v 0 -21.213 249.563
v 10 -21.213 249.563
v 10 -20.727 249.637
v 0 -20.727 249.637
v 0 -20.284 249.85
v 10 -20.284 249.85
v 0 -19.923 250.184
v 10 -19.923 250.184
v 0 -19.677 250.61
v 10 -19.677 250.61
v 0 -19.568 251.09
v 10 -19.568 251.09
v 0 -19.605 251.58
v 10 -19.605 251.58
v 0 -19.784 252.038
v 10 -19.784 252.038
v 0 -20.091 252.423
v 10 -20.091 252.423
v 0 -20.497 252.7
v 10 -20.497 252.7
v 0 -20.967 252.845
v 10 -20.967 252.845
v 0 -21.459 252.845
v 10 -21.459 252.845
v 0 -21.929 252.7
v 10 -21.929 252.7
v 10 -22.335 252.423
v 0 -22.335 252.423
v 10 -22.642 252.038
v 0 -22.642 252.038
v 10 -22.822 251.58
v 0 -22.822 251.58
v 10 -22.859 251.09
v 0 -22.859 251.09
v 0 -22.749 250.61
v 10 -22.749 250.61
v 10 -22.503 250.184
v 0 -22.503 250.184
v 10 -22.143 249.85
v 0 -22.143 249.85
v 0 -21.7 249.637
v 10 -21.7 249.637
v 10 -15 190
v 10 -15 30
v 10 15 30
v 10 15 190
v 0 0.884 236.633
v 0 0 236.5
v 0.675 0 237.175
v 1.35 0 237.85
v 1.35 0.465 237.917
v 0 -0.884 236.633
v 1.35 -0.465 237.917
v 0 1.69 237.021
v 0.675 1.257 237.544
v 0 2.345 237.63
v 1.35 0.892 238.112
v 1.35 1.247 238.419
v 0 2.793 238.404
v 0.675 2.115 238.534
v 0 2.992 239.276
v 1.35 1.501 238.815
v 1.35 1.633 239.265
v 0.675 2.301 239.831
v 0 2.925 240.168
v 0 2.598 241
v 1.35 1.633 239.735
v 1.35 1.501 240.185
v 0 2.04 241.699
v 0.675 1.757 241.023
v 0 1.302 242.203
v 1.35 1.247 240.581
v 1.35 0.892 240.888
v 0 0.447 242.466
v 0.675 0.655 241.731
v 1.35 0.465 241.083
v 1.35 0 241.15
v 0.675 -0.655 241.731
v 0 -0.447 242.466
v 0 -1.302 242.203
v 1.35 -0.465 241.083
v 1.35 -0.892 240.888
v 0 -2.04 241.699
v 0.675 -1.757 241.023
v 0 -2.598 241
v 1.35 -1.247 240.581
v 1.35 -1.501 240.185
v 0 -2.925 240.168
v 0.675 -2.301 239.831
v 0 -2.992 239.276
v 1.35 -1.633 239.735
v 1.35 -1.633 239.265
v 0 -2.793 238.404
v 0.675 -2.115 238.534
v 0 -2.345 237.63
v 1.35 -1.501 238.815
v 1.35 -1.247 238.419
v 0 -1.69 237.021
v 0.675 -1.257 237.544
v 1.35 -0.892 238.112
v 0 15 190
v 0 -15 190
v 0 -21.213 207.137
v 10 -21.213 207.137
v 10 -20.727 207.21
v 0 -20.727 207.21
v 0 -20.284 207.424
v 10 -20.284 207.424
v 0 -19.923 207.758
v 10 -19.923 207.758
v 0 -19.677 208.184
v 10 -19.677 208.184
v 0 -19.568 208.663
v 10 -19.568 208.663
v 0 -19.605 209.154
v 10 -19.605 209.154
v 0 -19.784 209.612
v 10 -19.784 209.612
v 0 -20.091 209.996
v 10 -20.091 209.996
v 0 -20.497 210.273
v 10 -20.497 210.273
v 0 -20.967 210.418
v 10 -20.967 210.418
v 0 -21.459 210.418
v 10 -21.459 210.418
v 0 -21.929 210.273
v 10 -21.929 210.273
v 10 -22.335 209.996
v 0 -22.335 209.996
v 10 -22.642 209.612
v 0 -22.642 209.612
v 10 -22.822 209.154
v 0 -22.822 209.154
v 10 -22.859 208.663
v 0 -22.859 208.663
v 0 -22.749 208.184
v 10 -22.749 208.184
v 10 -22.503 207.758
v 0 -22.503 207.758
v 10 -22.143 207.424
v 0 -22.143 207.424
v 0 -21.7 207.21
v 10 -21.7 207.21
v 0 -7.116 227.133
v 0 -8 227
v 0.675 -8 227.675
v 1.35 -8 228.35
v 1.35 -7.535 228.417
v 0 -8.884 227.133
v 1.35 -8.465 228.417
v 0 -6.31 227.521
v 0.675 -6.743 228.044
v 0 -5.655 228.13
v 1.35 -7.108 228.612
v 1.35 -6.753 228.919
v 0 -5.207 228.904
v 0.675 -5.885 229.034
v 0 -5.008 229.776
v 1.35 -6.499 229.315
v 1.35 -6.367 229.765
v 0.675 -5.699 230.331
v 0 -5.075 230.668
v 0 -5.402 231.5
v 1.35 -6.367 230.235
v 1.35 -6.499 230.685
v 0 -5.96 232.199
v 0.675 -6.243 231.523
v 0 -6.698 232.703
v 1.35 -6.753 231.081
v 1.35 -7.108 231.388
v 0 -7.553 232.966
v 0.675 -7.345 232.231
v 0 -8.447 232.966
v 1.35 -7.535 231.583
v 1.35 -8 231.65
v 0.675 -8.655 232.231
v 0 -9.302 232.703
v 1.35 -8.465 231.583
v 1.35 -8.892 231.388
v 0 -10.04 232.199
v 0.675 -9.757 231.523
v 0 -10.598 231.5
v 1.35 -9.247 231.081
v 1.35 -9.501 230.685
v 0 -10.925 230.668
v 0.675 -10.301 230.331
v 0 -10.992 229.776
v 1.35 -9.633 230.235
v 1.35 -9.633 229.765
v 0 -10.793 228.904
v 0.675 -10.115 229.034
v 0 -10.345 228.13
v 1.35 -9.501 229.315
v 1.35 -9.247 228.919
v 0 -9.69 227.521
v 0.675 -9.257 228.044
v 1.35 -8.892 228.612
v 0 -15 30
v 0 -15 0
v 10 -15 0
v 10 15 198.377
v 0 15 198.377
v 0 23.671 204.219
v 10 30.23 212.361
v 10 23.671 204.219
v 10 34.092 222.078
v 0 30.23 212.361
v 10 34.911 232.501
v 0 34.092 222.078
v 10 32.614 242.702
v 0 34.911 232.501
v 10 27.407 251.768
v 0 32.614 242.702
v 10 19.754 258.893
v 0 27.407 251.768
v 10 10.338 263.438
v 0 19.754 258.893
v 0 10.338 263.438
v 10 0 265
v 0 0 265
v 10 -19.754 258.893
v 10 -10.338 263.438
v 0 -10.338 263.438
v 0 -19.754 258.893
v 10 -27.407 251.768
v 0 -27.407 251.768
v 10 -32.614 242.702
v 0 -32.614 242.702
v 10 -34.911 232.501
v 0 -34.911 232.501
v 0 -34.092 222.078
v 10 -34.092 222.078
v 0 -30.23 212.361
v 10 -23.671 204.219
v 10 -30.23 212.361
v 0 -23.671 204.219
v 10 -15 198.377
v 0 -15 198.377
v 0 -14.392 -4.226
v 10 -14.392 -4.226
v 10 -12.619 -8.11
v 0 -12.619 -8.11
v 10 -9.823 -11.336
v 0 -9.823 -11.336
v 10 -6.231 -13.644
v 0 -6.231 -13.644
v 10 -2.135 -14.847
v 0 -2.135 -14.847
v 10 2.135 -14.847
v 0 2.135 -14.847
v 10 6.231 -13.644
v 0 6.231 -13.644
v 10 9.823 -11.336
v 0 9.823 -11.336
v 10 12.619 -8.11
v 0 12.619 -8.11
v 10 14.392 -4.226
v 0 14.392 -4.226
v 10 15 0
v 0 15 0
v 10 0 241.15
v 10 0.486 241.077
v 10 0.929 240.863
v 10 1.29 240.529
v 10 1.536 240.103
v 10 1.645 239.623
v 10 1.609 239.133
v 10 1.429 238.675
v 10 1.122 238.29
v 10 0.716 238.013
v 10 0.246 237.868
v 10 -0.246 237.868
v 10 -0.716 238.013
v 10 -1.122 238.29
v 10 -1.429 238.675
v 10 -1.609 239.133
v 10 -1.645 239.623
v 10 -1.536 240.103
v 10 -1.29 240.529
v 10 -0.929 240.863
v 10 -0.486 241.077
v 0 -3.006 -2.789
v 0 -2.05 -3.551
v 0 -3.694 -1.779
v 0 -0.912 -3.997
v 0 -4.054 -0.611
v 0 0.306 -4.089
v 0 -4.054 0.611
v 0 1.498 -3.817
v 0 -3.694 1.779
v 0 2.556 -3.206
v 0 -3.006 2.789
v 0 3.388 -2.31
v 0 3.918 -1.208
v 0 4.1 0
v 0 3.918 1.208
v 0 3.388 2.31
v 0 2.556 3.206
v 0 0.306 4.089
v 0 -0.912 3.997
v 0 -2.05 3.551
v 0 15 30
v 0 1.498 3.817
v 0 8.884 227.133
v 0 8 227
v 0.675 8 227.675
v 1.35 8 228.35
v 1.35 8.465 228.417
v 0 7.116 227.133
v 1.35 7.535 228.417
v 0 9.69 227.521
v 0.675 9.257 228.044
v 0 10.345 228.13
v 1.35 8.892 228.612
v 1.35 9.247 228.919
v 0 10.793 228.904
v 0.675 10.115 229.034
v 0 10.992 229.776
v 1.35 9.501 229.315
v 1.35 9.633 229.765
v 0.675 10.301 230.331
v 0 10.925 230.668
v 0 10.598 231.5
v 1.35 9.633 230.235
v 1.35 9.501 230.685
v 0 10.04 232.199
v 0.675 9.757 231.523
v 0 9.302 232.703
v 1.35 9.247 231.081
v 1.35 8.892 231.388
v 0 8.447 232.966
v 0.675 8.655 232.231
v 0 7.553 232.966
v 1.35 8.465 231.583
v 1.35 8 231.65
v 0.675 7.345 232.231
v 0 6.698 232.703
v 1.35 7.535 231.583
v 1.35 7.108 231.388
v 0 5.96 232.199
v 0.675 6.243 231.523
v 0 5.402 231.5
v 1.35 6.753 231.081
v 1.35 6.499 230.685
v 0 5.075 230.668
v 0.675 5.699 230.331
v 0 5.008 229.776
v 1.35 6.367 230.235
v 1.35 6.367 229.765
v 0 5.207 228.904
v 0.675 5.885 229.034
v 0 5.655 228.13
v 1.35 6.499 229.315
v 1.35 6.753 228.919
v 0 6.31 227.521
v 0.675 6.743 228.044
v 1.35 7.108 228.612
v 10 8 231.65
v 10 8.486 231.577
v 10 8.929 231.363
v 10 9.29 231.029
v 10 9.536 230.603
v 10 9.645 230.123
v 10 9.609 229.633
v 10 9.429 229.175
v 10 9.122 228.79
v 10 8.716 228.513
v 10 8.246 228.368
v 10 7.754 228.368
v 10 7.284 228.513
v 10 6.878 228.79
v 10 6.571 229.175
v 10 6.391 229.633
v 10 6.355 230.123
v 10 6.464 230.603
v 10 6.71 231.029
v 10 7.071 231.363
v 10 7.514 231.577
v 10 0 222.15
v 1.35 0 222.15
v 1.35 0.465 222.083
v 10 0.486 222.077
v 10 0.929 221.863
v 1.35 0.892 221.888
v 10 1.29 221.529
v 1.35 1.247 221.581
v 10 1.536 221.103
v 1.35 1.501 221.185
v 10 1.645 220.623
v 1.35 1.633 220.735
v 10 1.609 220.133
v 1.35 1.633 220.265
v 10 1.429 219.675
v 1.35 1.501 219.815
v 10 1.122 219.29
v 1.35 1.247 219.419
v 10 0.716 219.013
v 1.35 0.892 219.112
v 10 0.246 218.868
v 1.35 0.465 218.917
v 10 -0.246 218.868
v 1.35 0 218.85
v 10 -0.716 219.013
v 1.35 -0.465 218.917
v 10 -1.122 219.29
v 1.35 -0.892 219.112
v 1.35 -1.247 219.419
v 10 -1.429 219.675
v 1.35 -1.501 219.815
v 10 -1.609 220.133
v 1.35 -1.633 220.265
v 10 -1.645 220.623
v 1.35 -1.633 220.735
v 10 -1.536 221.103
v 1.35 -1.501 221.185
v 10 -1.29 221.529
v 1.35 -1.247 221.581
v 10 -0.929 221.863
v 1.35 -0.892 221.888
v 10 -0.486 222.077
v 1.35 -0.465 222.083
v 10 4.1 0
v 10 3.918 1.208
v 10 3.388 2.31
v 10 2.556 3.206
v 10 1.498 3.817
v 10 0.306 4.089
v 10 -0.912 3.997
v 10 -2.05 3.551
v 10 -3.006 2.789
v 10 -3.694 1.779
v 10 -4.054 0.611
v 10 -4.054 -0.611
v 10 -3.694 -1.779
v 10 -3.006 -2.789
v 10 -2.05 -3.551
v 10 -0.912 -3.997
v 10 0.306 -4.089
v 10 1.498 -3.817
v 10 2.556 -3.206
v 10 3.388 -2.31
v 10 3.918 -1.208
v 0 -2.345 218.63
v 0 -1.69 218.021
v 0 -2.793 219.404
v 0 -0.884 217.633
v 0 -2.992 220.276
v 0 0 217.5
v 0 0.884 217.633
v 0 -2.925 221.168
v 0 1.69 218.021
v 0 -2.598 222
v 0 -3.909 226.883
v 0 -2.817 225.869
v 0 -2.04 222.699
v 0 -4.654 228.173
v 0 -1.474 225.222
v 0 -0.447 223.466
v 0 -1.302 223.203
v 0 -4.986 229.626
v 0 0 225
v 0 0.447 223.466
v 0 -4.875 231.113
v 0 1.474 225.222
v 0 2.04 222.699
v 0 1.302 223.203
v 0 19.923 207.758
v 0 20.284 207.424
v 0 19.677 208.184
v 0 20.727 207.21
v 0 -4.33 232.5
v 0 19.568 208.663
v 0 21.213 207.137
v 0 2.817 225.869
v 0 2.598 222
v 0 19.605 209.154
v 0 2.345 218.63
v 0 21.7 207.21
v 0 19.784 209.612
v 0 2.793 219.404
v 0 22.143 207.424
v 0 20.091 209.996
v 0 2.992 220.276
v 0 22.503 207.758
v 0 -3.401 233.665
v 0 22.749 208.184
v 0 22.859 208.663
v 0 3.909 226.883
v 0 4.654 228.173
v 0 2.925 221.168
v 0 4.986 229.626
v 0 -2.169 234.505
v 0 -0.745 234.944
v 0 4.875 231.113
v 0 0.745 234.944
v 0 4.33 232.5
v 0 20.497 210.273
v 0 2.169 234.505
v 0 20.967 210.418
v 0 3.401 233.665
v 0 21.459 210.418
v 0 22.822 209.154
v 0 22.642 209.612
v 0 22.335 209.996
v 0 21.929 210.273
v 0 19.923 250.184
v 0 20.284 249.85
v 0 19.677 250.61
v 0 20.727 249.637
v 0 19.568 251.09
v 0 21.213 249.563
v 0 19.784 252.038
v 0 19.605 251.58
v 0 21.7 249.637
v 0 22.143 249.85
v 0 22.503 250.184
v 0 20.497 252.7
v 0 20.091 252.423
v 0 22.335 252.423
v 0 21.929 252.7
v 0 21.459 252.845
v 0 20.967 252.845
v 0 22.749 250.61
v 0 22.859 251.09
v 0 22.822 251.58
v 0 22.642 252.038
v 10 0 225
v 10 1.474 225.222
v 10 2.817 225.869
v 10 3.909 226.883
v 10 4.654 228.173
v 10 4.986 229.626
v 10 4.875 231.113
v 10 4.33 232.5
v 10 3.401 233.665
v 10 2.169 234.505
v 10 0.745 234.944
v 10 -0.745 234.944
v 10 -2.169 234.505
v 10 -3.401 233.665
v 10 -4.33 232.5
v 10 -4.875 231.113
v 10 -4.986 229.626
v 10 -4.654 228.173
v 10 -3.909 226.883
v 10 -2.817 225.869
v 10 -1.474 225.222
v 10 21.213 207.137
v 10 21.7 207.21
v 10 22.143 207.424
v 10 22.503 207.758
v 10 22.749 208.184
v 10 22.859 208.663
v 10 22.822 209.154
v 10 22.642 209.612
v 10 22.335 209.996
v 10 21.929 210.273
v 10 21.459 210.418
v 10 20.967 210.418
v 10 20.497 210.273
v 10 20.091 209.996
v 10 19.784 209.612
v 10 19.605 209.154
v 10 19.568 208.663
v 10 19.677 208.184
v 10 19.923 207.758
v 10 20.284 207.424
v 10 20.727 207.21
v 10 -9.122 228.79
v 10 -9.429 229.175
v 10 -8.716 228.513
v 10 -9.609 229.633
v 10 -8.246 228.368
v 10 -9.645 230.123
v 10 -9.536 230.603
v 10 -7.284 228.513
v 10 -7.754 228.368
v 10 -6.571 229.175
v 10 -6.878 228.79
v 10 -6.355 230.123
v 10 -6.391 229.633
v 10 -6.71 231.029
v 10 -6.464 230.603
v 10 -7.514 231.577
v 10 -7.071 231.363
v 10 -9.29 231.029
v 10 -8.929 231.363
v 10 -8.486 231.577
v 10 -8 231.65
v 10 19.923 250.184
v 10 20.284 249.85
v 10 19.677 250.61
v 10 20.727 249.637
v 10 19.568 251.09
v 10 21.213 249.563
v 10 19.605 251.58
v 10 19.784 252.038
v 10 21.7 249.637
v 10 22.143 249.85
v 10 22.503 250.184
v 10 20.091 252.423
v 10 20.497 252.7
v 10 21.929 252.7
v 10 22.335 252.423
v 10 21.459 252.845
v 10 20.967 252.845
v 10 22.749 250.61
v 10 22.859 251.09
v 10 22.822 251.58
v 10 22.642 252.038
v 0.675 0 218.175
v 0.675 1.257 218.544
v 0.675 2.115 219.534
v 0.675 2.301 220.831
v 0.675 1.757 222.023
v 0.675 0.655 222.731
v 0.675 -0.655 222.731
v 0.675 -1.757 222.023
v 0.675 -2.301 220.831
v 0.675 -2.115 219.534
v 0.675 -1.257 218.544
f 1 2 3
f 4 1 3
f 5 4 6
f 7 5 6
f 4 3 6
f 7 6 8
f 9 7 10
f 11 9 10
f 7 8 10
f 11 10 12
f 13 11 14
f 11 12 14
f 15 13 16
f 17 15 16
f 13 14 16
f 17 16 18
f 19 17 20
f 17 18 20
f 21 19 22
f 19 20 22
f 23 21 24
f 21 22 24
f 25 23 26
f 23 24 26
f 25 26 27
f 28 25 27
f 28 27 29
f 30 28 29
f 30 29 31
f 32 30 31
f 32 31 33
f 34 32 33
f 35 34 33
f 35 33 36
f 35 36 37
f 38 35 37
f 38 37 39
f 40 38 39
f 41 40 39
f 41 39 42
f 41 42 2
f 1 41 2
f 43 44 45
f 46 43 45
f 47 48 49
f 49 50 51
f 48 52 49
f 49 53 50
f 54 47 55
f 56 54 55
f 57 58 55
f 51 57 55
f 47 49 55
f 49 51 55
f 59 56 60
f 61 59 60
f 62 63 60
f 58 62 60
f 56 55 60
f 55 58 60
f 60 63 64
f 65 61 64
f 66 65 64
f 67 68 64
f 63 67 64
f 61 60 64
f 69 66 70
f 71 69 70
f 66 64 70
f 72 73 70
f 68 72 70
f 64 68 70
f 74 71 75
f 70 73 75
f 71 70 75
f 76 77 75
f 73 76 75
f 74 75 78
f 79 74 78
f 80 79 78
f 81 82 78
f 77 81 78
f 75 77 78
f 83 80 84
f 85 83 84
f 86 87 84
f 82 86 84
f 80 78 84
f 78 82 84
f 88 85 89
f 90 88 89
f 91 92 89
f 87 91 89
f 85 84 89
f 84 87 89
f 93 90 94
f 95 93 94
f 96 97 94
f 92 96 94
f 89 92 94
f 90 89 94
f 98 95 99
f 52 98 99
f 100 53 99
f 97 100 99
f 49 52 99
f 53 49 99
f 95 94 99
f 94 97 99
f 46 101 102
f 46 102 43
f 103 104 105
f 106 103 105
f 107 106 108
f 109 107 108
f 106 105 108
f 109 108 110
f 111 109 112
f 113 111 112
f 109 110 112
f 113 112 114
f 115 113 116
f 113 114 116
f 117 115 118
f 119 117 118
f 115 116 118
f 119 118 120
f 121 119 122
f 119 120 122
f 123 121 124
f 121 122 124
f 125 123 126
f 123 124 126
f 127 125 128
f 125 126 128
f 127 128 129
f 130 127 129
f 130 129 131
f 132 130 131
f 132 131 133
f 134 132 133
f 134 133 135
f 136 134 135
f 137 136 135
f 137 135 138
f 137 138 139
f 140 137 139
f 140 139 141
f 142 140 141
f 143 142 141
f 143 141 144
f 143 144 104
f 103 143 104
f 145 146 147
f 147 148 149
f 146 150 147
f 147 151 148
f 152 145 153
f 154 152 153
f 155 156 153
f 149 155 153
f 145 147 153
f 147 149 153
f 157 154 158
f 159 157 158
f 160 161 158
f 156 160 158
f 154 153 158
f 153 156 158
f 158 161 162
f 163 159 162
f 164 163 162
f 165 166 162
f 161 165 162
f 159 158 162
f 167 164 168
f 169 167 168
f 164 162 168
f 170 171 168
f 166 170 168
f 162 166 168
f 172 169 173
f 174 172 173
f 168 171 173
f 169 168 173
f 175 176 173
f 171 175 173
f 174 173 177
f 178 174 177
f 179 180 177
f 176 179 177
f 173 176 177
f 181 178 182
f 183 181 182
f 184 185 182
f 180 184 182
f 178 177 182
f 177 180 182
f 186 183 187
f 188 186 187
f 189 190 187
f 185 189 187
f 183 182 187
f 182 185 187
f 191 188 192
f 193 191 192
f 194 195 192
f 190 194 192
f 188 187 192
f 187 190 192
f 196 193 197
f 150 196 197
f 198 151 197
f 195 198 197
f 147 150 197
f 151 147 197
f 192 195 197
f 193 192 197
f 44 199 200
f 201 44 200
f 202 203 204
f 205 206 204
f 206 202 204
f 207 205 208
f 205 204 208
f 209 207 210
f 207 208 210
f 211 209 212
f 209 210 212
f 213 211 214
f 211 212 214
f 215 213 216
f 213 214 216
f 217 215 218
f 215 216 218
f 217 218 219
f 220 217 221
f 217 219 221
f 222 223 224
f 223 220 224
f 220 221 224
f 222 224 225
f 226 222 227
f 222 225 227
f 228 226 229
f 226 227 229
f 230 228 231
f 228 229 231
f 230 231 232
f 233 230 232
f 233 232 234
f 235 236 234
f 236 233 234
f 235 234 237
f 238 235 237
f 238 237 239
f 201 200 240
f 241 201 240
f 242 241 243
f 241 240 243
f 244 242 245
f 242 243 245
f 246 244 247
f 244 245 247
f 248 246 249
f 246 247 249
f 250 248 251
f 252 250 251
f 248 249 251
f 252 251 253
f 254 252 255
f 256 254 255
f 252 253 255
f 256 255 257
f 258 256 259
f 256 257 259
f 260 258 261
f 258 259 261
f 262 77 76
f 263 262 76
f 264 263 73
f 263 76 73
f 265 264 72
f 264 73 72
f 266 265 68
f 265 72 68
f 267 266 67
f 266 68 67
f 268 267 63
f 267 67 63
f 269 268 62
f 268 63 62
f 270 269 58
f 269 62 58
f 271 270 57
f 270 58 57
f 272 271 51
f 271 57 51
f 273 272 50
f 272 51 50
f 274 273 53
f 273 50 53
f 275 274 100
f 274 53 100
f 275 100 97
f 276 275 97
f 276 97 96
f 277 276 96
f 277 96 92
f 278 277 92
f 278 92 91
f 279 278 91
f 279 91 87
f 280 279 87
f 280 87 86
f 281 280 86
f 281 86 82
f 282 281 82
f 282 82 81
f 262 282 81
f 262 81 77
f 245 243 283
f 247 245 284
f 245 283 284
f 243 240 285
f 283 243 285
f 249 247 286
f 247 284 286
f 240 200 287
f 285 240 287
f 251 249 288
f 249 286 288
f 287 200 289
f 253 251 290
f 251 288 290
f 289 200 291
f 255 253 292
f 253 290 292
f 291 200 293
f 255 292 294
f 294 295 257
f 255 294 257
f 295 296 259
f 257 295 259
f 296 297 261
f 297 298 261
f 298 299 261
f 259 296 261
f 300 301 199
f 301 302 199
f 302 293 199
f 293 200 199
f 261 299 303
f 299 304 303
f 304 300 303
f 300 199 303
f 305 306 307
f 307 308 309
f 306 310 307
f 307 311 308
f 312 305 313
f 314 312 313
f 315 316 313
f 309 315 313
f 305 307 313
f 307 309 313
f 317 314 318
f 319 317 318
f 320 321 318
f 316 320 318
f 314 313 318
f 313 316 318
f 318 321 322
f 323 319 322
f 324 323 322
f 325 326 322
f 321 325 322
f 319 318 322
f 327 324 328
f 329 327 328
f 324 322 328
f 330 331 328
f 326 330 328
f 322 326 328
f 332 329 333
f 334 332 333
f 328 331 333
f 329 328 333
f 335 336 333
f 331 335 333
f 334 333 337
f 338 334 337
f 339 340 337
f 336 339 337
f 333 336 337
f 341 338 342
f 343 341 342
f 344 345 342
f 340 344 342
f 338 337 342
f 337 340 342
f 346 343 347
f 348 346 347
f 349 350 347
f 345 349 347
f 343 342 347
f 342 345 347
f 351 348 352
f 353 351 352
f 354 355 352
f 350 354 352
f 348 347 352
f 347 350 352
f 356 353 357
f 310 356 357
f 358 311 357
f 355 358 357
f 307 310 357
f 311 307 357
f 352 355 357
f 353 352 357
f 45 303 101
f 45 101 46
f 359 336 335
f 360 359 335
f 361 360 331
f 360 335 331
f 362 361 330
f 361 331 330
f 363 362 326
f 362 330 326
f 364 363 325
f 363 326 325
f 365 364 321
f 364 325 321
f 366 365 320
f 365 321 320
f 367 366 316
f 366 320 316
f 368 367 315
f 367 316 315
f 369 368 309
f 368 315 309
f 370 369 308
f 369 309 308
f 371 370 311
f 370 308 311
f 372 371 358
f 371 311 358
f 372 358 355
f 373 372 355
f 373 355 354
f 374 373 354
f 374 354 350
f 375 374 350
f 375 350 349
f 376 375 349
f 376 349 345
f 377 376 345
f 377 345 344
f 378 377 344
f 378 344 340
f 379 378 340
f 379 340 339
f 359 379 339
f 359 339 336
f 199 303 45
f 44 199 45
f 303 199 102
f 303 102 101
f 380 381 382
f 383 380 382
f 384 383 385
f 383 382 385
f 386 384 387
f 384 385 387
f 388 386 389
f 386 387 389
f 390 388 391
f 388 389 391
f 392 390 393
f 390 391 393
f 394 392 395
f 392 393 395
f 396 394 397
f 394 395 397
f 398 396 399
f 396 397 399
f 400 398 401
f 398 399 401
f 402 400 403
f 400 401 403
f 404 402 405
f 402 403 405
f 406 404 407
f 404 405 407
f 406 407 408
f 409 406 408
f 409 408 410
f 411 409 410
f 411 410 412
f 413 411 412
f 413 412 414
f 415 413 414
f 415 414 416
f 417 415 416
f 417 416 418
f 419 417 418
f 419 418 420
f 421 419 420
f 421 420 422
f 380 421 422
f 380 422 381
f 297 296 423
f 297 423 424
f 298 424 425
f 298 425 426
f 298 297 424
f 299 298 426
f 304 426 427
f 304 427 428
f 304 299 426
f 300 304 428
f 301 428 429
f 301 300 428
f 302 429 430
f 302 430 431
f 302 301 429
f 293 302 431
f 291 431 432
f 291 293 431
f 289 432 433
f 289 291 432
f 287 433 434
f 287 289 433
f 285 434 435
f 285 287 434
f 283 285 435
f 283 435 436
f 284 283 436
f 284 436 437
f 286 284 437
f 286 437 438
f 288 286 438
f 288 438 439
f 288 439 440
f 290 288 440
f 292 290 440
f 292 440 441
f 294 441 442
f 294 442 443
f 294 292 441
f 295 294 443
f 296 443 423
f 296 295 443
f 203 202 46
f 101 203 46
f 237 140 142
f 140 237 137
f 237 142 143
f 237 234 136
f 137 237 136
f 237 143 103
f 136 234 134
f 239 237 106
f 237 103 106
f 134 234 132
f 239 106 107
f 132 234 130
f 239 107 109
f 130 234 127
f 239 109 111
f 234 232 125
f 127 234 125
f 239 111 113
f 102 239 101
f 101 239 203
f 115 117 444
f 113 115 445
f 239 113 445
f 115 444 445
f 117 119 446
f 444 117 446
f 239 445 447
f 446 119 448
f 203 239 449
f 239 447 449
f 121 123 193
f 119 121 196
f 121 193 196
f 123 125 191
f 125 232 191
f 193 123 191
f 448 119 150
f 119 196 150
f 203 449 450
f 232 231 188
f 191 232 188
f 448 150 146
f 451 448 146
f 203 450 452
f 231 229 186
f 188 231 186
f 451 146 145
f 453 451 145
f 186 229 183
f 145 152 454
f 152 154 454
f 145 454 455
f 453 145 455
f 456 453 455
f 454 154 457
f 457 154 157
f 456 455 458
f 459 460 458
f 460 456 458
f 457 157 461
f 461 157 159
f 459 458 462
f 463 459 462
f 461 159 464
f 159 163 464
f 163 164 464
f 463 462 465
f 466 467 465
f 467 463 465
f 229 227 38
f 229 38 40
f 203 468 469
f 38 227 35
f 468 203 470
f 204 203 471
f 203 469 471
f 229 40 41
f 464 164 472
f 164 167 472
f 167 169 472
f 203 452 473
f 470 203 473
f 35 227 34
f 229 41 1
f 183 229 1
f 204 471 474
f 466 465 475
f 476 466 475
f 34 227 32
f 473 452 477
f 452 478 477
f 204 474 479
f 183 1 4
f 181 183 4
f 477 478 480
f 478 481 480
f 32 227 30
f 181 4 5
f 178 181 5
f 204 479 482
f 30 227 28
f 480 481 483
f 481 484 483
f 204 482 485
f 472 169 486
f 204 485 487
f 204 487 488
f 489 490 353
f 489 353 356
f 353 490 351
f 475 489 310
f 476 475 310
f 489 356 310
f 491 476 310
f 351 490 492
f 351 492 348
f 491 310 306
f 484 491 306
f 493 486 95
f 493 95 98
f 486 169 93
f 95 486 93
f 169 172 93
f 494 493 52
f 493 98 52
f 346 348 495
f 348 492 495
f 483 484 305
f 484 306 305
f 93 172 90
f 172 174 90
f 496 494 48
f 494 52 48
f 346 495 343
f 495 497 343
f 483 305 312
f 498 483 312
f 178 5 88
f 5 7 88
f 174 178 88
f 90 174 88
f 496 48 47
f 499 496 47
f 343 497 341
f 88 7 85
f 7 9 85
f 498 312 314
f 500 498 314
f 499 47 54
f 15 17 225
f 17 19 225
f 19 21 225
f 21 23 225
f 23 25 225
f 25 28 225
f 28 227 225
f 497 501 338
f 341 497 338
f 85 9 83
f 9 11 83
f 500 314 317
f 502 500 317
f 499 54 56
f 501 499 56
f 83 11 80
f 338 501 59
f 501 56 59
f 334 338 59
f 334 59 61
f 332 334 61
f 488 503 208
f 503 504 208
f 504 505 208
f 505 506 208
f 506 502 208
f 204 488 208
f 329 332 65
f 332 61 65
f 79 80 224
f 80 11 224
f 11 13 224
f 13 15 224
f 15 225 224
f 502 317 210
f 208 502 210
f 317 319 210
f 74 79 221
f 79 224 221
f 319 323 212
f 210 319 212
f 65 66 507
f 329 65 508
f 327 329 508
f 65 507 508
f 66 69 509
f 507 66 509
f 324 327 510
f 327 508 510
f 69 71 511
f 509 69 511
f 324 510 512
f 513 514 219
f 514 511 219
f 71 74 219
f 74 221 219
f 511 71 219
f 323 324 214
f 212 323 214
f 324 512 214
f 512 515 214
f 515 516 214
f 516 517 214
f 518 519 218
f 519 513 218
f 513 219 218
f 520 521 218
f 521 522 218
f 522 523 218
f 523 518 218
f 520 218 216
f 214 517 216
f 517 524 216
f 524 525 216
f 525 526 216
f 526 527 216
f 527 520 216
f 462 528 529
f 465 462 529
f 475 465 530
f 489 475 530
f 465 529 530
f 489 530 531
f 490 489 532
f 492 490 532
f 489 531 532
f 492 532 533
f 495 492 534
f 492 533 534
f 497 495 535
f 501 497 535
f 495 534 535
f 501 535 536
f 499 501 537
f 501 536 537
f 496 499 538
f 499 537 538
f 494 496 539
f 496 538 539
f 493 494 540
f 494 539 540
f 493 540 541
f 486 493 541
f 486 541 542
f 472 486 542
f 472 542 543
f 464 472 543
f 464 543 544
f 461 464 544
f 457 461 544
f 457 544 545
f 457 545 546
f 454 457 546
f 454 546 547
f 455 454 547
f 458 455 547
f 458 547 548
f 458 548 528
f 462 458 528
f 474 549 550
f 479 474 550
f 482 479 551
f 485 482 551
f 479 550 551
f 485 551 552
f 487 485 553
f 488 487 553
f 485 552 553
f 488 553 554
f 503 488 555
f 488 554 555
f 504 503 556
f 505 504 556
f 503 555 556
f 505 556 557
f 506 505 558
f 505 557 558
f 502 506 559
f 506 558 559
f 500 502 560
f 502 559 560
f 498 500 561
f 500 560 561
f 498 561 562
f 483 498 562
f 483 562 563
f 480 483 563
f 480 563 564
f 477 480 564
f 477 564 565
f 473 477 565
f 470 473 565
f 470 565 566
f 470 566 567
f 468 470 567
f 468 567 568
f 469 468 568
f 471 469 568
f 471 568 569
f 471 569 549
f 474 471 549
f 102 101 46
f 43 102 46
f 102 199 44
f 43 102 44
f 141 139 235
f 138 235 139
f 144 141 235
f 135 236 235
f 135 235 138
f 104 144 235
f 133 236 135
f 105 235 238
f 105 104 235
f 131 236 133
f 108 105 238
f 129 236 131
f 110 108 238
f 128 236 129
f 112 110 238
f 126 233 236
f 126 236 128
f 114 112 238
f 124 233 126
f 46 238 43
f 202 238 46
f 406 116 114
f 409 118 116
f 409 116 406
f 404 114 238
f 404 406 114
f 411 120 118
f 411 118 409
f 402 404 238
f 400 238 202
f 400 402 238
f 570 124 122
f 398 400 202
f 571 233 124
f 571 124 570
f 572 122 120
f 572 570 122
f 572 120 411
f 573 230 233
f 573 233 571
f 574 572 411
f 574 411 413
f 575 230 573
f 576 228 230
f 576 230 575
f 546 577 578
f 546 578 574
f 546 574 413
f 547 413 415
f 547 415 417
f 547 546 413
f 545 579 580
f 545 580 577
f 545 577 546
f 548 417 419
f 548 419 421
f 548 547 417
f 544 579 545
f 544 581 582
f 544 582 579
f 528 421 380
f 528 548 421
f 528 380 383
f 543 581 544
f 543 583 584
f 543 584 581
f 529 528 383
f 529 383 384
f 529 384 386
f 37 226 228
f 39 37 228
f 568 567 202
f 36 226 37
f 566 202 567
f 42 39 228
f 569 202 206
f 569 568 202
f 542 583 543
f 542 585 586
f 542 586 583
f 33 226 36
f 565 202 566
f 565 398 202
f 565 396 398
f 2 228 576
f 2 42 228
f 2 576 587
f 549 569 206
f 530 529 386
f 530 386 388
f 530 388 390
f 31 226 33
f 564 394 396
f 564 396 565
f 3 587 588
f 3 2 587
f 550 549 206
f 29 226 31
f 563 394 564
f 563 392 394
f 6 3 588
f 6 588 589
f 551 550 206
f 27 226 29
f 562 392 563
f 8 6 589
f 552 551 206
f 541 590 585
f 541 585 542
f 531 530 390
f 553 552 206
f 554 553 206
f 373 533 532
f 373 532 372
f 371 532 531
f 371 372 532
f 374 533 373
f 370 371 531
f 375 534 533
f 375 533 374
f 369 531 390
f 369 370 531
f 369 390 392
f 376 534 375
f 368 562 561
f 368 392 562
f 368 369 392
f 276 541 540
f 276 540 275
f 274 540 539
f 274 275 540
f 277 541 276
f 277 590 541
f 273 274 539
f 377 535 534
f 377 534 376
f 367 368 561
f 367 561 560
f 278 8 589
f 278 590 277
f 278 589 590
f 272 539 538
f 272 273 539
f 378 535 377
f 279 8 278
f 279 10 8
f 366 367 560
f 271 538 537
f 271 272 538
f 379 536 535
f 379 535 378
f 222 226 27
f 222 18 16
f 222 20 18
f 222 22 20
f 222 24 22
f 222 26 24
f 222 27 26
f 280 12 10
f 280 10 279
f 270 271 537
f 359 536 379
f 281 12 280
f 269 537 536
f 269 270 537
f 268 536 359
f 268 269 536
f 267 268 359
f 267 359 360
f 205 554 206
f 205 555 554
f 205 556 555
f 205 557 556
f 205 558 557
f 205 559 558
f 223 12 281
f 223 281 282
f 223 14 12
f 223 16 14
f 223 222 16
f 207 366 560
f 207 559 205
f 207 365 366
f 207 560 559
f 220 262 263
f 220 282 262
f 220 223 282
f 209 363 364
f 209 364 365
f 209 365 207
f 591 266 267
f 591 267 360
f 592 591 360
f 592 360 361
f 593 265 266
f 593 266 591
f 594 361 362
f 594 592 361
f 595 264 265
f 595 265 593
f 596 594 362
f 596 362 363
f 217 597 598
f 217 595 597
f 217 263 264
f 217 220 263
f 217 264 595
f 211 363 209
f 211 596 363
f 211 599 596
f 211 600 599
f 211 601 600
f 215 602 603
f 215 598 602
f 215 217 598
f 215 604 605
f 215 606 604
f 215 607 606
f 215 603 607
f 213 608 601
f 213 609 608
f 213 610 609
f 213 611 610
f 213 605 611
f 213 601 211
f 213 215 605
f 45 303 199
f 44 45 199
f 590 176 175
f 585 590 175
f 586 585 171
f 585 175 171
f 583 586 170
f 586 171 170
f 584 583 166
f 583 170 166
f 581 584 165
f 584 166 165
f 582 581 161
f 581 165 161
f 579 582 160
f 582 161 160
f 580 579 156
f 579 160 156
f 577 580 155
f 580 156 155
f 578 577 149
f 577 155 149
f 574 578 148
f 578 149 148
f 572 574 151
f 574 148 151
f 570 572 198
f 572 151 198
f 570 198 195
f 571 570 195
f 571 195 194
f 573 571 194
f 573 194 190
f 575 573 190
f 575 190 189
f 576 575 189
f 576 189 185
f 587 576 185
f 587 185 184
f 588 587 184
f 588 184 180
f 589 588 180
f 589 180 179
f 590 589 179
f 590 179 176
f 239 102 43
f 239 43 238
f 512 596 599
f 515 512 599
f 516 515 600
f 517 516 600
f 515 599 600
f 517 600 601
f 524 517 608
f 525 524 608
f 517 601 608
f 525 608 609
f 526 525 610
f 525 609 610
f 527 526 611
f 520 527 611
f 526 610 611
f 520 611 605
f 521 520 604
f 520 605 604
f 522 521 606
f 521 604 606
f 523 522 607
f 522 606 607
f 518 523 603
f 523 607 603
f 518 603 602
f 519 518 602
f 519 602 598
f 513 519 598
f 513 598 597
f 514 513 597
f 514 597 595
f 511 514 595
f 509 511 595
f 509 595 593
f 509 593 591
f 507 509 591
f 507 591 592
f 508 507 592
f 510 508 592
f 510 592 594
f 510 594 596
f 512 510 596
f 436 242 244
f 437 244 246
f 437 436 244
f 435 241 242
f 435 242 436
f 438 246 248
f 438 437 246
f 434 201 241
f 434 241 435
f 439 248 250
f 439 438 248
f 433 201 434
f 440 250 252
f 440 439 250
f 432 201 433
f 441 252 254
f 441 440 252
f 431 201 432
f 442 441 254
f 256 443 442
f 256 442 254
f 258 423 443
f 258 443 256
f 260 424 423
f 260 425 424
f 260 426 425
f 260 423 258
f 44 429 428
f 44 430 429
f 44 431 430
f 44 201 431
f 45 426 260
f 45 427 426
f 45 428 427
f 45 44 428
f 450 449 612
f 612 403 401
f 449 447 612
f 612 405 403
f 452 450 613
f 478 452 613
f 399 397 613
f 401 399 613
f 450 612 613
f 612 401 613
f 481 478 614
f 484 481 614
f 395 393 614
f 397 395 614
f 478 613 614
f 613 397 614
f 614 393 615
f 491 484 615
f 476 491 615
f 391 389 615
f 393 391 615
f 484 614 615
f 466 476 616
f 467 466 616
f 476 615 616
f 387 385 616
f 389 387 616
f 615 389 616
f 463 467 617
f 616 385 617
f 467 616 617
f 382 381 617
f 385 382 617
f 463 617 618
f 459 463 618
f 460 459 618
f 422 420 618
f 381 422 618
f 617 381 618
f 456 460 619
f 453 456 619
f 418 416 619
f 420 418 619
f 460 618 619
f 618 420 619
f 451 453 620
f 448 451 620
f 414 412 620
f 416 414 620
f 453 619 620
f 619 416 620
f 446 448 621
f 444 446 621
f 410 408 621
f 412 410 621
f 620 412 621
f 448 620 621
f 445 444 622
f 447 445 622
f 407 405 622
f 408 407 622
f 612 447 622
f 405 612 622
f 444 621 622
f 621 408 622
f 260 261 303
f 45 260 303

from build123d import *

# Parameters (mm, degrees)
BOSS_EXTRUDE1_DEPTH = 10
SKETCH2_R           = 4.1
CUT_EXTRUDE1_DEPTH  = 246.662369931
SKETCH3_R           = 1.5
CUT_EXTRUDE2_DEPTH  = 246.662369931
SKETCH4_R           = 5
CUT_EXTRUDE3_DEPTH  = 246.662369931
BOSS_EXTRUDE2_START = -10
SKETCH5_R           = 35
SKETCH5_R_2         = 15
BOSS_EXTRUDE2_DEPTH = 10
SKETCH6_R           = 1.65
CUT_EXTRUDE4_DEPTH  = 268.488317502
CHAMFER3_SIZE       = 1.5
SKETCH7_R           = 1.65
CUT_EXTRUDE5_DEPTH  = 268.488317502
SPLIT1_OUTLINE_R    = 4.1
SPLIT1_DEPTH        = 10
SPLIT1_START        = -15
SPLIT1_2_OUTLINE_W  = 10
SPLIT1_2_OUTLINE_H  = 30
SPLIT1_2_DEPTH      = 205
SPLIT1_START_2      = 30
SPLIT1_3_OUTLINE_W  = 10
SPLIT1_3_OUTLINE_H  = 30
SPLIT1_3_DEPTH      = 160


# Read off the part's stored shape, not the designer's step: Split1
with BuildPart() as part:
    # Sketch1 → Boss-Extrude1 (new body)
    with BuildSketch(Plane.YZ):
        with BuildLine():
            Line((-15, 0), (-15, 230))
            ThreePointArc((-15, 230), (0, 245), (15, 230))
            Line((15, 230), (15, 0))
            ThreePointArc((15, 0), (0, -15), (-15, 0))
        make_face()
    extrude(amount=BOSS_EXTRUDE1_DEPTH)

    # Sketch2 → Cut-Extrude1 (cut, through all)
    with BuildSketch(Plane.YZ.offset(10)):
        with Locations(Location((0, 0, 0), (0, 0, 270))):
            Circle(SKETCH2_R)
    extrude(amount=-CUT_EXTRUDE1_DEPTH, mode=Mode.SUBTRACT)

    # Sketch3 → Cut-Extrude2 (cut, through all)
    with BuildSketch(Plane.YZ.offset(10)):
        with Locations(Location((0, 239.5, 0), (0, 0, 270))):
            Circle(SKETCH3_R)
        with Locations(Location((8, 230, 0), (0, 0, 270))):
            Circle(SKETCH3_R)
        with Locations(Location((-8, 230, 0), (0, 0, 270))):
            Circle(SKETCH3_R)
        with Locations(Location((0, 220.5, 0), (0, 0, 270))):
            Circle(SKETCH3_R)
    extrude(amount=-CUT_EXTRUDE2_DEPTH, mode=Mode.SUBTRACT)

    # Sketch4 → Cut-Extrude3 (cut, through all)
    with BuildSketch(Plane.YZ.offset(10)):
        with Locations(Location((0, 230, 0), (0, 0, 270))):
            Circle(SKETCH4_R)
    extrude(amount=-CUT_EXTRUDE3_DEPTH, mode=Mode.SUBTRACT)

    # Sketch5 → Boss-Extrude2 (add)
    with BuildSketch(Plane.YZ.offset(10).offset(BOSS_EXTRUDE2_START)):
        with Locations((0, 230)):
            Circle(SKETCH5_R)
        with Locations((0, 230)):
            Circle(SKETCH5_R_2, mode=Mode.SUBTRACT)
    extrude(amount=BOSS_EXTRUDE2_DEPTH)

    # Sketch6 → Cut-Extrude4 (cut, through all)
    with BuildSketch(Plane.YZ.offset(10)):
        with Locations(Location((-21.213203436, 251.213203436, 0), (0, 0, 270))):
            Circle(SKETCH6_R)
        with Locations(Location((21.213203436, 251.213203436, 0), (0, 0, 270))):
            Circle(SKETCH6_R)
        with Locations(Location((21.213203436, 208.786796564, 0), (0, 0, 270))):
            Circle(SKETCH6_R)
        with Locations(Location((-21.213203436, 208.786796564, 0), (0, 0, 270))):
            Circle(SKETCH6_R)
    extrude(amount=-CUT_EXTRUDE4_DEPTH, mode=Mode.SUBTRACT)

    # Chamfer3
    chamfer3_edges = [part.edges().sort_by_distance(p)[0] for p in [
        (0, 0, 241),
        (0, 8, 231.5),
        (0, -8, 231.5),
        (0, 0, 222),
    ]]
    chamfer(chamfer3_edges, length=CHAMFER3_SIZE - 0.0001)  # a hair under: the kernel refuses the full size

    # Sketch7 → Cut-Extrude5 (cut, through all)
    with BuildSketch(Plane(origin=(0, 0, 0), x_dir=(0, -1, 0), z_dir=(-1, 0, 0))):
        with Locations(Location((0, 239.5, 0), (0, 0, 90))):
            Circle(SKETCH7_R)
        with Locations(Location((8, 230, 0), (0, 0, 90))):
            Circle(SKETCH7_R)
        with Locations(Location((0, 220.5, 0), (0, 0, 90))):
            Circle(SKETCH7_R)
        with Locations(Location((-8, 230, 0), (0, 0, 90))):
            Circle(SKETCH7_R)
    extrude(amount=-CUT_EXTRUDE5_DEPTH, mode=Mode.SUBTRACT)

    # Split1 2 outline → Split1 2 (cut)
    with BuildSketch(Plane.XY.offset(SPLIT1_START)):
        with Locations((5, 0)):
            Rectangle(SPLIT1_2_OUTLINE_W, SPLIT1_2_OUTLINE_H)
    extrude(amount=SPLIT1_2_DEPTH, mode=Mode.SUBTRACT)


with BuildPart() as body_2:
    # Split1 outline → Split1 (new body)
    with BuildSketch(Plane.YZ):
        with BuildLine():
            Line((15, 0), (15, 30))
            Line((15, 30), (-15, 30))
            Line((-15, 30), (-15, 0))
            ThreePointArc((-15, 0), (0, -15), (15, 0))
        make_face()
        Circle(SPLIT1_OUTLINE_R, mode=Mode.SUBTRACT)
    extrude(amount=SPLIT1_DEPTH)


with BuildPart() as body_3:
    # Split1 3 outline → Split1 3 (new body)
    with BuildSketch(Plane.XY.offset(SPLIT1_START_2)):
        with Locations((5, 0)):
            Rectangle(SPLIT1_3_OUTLINE_W, SPLIT1_3_OUTLINE_H)
    extrude(amount=SPLIT1_3_DEPTH)


solid = Compound([part.part, body_2.part, body_3.part])
